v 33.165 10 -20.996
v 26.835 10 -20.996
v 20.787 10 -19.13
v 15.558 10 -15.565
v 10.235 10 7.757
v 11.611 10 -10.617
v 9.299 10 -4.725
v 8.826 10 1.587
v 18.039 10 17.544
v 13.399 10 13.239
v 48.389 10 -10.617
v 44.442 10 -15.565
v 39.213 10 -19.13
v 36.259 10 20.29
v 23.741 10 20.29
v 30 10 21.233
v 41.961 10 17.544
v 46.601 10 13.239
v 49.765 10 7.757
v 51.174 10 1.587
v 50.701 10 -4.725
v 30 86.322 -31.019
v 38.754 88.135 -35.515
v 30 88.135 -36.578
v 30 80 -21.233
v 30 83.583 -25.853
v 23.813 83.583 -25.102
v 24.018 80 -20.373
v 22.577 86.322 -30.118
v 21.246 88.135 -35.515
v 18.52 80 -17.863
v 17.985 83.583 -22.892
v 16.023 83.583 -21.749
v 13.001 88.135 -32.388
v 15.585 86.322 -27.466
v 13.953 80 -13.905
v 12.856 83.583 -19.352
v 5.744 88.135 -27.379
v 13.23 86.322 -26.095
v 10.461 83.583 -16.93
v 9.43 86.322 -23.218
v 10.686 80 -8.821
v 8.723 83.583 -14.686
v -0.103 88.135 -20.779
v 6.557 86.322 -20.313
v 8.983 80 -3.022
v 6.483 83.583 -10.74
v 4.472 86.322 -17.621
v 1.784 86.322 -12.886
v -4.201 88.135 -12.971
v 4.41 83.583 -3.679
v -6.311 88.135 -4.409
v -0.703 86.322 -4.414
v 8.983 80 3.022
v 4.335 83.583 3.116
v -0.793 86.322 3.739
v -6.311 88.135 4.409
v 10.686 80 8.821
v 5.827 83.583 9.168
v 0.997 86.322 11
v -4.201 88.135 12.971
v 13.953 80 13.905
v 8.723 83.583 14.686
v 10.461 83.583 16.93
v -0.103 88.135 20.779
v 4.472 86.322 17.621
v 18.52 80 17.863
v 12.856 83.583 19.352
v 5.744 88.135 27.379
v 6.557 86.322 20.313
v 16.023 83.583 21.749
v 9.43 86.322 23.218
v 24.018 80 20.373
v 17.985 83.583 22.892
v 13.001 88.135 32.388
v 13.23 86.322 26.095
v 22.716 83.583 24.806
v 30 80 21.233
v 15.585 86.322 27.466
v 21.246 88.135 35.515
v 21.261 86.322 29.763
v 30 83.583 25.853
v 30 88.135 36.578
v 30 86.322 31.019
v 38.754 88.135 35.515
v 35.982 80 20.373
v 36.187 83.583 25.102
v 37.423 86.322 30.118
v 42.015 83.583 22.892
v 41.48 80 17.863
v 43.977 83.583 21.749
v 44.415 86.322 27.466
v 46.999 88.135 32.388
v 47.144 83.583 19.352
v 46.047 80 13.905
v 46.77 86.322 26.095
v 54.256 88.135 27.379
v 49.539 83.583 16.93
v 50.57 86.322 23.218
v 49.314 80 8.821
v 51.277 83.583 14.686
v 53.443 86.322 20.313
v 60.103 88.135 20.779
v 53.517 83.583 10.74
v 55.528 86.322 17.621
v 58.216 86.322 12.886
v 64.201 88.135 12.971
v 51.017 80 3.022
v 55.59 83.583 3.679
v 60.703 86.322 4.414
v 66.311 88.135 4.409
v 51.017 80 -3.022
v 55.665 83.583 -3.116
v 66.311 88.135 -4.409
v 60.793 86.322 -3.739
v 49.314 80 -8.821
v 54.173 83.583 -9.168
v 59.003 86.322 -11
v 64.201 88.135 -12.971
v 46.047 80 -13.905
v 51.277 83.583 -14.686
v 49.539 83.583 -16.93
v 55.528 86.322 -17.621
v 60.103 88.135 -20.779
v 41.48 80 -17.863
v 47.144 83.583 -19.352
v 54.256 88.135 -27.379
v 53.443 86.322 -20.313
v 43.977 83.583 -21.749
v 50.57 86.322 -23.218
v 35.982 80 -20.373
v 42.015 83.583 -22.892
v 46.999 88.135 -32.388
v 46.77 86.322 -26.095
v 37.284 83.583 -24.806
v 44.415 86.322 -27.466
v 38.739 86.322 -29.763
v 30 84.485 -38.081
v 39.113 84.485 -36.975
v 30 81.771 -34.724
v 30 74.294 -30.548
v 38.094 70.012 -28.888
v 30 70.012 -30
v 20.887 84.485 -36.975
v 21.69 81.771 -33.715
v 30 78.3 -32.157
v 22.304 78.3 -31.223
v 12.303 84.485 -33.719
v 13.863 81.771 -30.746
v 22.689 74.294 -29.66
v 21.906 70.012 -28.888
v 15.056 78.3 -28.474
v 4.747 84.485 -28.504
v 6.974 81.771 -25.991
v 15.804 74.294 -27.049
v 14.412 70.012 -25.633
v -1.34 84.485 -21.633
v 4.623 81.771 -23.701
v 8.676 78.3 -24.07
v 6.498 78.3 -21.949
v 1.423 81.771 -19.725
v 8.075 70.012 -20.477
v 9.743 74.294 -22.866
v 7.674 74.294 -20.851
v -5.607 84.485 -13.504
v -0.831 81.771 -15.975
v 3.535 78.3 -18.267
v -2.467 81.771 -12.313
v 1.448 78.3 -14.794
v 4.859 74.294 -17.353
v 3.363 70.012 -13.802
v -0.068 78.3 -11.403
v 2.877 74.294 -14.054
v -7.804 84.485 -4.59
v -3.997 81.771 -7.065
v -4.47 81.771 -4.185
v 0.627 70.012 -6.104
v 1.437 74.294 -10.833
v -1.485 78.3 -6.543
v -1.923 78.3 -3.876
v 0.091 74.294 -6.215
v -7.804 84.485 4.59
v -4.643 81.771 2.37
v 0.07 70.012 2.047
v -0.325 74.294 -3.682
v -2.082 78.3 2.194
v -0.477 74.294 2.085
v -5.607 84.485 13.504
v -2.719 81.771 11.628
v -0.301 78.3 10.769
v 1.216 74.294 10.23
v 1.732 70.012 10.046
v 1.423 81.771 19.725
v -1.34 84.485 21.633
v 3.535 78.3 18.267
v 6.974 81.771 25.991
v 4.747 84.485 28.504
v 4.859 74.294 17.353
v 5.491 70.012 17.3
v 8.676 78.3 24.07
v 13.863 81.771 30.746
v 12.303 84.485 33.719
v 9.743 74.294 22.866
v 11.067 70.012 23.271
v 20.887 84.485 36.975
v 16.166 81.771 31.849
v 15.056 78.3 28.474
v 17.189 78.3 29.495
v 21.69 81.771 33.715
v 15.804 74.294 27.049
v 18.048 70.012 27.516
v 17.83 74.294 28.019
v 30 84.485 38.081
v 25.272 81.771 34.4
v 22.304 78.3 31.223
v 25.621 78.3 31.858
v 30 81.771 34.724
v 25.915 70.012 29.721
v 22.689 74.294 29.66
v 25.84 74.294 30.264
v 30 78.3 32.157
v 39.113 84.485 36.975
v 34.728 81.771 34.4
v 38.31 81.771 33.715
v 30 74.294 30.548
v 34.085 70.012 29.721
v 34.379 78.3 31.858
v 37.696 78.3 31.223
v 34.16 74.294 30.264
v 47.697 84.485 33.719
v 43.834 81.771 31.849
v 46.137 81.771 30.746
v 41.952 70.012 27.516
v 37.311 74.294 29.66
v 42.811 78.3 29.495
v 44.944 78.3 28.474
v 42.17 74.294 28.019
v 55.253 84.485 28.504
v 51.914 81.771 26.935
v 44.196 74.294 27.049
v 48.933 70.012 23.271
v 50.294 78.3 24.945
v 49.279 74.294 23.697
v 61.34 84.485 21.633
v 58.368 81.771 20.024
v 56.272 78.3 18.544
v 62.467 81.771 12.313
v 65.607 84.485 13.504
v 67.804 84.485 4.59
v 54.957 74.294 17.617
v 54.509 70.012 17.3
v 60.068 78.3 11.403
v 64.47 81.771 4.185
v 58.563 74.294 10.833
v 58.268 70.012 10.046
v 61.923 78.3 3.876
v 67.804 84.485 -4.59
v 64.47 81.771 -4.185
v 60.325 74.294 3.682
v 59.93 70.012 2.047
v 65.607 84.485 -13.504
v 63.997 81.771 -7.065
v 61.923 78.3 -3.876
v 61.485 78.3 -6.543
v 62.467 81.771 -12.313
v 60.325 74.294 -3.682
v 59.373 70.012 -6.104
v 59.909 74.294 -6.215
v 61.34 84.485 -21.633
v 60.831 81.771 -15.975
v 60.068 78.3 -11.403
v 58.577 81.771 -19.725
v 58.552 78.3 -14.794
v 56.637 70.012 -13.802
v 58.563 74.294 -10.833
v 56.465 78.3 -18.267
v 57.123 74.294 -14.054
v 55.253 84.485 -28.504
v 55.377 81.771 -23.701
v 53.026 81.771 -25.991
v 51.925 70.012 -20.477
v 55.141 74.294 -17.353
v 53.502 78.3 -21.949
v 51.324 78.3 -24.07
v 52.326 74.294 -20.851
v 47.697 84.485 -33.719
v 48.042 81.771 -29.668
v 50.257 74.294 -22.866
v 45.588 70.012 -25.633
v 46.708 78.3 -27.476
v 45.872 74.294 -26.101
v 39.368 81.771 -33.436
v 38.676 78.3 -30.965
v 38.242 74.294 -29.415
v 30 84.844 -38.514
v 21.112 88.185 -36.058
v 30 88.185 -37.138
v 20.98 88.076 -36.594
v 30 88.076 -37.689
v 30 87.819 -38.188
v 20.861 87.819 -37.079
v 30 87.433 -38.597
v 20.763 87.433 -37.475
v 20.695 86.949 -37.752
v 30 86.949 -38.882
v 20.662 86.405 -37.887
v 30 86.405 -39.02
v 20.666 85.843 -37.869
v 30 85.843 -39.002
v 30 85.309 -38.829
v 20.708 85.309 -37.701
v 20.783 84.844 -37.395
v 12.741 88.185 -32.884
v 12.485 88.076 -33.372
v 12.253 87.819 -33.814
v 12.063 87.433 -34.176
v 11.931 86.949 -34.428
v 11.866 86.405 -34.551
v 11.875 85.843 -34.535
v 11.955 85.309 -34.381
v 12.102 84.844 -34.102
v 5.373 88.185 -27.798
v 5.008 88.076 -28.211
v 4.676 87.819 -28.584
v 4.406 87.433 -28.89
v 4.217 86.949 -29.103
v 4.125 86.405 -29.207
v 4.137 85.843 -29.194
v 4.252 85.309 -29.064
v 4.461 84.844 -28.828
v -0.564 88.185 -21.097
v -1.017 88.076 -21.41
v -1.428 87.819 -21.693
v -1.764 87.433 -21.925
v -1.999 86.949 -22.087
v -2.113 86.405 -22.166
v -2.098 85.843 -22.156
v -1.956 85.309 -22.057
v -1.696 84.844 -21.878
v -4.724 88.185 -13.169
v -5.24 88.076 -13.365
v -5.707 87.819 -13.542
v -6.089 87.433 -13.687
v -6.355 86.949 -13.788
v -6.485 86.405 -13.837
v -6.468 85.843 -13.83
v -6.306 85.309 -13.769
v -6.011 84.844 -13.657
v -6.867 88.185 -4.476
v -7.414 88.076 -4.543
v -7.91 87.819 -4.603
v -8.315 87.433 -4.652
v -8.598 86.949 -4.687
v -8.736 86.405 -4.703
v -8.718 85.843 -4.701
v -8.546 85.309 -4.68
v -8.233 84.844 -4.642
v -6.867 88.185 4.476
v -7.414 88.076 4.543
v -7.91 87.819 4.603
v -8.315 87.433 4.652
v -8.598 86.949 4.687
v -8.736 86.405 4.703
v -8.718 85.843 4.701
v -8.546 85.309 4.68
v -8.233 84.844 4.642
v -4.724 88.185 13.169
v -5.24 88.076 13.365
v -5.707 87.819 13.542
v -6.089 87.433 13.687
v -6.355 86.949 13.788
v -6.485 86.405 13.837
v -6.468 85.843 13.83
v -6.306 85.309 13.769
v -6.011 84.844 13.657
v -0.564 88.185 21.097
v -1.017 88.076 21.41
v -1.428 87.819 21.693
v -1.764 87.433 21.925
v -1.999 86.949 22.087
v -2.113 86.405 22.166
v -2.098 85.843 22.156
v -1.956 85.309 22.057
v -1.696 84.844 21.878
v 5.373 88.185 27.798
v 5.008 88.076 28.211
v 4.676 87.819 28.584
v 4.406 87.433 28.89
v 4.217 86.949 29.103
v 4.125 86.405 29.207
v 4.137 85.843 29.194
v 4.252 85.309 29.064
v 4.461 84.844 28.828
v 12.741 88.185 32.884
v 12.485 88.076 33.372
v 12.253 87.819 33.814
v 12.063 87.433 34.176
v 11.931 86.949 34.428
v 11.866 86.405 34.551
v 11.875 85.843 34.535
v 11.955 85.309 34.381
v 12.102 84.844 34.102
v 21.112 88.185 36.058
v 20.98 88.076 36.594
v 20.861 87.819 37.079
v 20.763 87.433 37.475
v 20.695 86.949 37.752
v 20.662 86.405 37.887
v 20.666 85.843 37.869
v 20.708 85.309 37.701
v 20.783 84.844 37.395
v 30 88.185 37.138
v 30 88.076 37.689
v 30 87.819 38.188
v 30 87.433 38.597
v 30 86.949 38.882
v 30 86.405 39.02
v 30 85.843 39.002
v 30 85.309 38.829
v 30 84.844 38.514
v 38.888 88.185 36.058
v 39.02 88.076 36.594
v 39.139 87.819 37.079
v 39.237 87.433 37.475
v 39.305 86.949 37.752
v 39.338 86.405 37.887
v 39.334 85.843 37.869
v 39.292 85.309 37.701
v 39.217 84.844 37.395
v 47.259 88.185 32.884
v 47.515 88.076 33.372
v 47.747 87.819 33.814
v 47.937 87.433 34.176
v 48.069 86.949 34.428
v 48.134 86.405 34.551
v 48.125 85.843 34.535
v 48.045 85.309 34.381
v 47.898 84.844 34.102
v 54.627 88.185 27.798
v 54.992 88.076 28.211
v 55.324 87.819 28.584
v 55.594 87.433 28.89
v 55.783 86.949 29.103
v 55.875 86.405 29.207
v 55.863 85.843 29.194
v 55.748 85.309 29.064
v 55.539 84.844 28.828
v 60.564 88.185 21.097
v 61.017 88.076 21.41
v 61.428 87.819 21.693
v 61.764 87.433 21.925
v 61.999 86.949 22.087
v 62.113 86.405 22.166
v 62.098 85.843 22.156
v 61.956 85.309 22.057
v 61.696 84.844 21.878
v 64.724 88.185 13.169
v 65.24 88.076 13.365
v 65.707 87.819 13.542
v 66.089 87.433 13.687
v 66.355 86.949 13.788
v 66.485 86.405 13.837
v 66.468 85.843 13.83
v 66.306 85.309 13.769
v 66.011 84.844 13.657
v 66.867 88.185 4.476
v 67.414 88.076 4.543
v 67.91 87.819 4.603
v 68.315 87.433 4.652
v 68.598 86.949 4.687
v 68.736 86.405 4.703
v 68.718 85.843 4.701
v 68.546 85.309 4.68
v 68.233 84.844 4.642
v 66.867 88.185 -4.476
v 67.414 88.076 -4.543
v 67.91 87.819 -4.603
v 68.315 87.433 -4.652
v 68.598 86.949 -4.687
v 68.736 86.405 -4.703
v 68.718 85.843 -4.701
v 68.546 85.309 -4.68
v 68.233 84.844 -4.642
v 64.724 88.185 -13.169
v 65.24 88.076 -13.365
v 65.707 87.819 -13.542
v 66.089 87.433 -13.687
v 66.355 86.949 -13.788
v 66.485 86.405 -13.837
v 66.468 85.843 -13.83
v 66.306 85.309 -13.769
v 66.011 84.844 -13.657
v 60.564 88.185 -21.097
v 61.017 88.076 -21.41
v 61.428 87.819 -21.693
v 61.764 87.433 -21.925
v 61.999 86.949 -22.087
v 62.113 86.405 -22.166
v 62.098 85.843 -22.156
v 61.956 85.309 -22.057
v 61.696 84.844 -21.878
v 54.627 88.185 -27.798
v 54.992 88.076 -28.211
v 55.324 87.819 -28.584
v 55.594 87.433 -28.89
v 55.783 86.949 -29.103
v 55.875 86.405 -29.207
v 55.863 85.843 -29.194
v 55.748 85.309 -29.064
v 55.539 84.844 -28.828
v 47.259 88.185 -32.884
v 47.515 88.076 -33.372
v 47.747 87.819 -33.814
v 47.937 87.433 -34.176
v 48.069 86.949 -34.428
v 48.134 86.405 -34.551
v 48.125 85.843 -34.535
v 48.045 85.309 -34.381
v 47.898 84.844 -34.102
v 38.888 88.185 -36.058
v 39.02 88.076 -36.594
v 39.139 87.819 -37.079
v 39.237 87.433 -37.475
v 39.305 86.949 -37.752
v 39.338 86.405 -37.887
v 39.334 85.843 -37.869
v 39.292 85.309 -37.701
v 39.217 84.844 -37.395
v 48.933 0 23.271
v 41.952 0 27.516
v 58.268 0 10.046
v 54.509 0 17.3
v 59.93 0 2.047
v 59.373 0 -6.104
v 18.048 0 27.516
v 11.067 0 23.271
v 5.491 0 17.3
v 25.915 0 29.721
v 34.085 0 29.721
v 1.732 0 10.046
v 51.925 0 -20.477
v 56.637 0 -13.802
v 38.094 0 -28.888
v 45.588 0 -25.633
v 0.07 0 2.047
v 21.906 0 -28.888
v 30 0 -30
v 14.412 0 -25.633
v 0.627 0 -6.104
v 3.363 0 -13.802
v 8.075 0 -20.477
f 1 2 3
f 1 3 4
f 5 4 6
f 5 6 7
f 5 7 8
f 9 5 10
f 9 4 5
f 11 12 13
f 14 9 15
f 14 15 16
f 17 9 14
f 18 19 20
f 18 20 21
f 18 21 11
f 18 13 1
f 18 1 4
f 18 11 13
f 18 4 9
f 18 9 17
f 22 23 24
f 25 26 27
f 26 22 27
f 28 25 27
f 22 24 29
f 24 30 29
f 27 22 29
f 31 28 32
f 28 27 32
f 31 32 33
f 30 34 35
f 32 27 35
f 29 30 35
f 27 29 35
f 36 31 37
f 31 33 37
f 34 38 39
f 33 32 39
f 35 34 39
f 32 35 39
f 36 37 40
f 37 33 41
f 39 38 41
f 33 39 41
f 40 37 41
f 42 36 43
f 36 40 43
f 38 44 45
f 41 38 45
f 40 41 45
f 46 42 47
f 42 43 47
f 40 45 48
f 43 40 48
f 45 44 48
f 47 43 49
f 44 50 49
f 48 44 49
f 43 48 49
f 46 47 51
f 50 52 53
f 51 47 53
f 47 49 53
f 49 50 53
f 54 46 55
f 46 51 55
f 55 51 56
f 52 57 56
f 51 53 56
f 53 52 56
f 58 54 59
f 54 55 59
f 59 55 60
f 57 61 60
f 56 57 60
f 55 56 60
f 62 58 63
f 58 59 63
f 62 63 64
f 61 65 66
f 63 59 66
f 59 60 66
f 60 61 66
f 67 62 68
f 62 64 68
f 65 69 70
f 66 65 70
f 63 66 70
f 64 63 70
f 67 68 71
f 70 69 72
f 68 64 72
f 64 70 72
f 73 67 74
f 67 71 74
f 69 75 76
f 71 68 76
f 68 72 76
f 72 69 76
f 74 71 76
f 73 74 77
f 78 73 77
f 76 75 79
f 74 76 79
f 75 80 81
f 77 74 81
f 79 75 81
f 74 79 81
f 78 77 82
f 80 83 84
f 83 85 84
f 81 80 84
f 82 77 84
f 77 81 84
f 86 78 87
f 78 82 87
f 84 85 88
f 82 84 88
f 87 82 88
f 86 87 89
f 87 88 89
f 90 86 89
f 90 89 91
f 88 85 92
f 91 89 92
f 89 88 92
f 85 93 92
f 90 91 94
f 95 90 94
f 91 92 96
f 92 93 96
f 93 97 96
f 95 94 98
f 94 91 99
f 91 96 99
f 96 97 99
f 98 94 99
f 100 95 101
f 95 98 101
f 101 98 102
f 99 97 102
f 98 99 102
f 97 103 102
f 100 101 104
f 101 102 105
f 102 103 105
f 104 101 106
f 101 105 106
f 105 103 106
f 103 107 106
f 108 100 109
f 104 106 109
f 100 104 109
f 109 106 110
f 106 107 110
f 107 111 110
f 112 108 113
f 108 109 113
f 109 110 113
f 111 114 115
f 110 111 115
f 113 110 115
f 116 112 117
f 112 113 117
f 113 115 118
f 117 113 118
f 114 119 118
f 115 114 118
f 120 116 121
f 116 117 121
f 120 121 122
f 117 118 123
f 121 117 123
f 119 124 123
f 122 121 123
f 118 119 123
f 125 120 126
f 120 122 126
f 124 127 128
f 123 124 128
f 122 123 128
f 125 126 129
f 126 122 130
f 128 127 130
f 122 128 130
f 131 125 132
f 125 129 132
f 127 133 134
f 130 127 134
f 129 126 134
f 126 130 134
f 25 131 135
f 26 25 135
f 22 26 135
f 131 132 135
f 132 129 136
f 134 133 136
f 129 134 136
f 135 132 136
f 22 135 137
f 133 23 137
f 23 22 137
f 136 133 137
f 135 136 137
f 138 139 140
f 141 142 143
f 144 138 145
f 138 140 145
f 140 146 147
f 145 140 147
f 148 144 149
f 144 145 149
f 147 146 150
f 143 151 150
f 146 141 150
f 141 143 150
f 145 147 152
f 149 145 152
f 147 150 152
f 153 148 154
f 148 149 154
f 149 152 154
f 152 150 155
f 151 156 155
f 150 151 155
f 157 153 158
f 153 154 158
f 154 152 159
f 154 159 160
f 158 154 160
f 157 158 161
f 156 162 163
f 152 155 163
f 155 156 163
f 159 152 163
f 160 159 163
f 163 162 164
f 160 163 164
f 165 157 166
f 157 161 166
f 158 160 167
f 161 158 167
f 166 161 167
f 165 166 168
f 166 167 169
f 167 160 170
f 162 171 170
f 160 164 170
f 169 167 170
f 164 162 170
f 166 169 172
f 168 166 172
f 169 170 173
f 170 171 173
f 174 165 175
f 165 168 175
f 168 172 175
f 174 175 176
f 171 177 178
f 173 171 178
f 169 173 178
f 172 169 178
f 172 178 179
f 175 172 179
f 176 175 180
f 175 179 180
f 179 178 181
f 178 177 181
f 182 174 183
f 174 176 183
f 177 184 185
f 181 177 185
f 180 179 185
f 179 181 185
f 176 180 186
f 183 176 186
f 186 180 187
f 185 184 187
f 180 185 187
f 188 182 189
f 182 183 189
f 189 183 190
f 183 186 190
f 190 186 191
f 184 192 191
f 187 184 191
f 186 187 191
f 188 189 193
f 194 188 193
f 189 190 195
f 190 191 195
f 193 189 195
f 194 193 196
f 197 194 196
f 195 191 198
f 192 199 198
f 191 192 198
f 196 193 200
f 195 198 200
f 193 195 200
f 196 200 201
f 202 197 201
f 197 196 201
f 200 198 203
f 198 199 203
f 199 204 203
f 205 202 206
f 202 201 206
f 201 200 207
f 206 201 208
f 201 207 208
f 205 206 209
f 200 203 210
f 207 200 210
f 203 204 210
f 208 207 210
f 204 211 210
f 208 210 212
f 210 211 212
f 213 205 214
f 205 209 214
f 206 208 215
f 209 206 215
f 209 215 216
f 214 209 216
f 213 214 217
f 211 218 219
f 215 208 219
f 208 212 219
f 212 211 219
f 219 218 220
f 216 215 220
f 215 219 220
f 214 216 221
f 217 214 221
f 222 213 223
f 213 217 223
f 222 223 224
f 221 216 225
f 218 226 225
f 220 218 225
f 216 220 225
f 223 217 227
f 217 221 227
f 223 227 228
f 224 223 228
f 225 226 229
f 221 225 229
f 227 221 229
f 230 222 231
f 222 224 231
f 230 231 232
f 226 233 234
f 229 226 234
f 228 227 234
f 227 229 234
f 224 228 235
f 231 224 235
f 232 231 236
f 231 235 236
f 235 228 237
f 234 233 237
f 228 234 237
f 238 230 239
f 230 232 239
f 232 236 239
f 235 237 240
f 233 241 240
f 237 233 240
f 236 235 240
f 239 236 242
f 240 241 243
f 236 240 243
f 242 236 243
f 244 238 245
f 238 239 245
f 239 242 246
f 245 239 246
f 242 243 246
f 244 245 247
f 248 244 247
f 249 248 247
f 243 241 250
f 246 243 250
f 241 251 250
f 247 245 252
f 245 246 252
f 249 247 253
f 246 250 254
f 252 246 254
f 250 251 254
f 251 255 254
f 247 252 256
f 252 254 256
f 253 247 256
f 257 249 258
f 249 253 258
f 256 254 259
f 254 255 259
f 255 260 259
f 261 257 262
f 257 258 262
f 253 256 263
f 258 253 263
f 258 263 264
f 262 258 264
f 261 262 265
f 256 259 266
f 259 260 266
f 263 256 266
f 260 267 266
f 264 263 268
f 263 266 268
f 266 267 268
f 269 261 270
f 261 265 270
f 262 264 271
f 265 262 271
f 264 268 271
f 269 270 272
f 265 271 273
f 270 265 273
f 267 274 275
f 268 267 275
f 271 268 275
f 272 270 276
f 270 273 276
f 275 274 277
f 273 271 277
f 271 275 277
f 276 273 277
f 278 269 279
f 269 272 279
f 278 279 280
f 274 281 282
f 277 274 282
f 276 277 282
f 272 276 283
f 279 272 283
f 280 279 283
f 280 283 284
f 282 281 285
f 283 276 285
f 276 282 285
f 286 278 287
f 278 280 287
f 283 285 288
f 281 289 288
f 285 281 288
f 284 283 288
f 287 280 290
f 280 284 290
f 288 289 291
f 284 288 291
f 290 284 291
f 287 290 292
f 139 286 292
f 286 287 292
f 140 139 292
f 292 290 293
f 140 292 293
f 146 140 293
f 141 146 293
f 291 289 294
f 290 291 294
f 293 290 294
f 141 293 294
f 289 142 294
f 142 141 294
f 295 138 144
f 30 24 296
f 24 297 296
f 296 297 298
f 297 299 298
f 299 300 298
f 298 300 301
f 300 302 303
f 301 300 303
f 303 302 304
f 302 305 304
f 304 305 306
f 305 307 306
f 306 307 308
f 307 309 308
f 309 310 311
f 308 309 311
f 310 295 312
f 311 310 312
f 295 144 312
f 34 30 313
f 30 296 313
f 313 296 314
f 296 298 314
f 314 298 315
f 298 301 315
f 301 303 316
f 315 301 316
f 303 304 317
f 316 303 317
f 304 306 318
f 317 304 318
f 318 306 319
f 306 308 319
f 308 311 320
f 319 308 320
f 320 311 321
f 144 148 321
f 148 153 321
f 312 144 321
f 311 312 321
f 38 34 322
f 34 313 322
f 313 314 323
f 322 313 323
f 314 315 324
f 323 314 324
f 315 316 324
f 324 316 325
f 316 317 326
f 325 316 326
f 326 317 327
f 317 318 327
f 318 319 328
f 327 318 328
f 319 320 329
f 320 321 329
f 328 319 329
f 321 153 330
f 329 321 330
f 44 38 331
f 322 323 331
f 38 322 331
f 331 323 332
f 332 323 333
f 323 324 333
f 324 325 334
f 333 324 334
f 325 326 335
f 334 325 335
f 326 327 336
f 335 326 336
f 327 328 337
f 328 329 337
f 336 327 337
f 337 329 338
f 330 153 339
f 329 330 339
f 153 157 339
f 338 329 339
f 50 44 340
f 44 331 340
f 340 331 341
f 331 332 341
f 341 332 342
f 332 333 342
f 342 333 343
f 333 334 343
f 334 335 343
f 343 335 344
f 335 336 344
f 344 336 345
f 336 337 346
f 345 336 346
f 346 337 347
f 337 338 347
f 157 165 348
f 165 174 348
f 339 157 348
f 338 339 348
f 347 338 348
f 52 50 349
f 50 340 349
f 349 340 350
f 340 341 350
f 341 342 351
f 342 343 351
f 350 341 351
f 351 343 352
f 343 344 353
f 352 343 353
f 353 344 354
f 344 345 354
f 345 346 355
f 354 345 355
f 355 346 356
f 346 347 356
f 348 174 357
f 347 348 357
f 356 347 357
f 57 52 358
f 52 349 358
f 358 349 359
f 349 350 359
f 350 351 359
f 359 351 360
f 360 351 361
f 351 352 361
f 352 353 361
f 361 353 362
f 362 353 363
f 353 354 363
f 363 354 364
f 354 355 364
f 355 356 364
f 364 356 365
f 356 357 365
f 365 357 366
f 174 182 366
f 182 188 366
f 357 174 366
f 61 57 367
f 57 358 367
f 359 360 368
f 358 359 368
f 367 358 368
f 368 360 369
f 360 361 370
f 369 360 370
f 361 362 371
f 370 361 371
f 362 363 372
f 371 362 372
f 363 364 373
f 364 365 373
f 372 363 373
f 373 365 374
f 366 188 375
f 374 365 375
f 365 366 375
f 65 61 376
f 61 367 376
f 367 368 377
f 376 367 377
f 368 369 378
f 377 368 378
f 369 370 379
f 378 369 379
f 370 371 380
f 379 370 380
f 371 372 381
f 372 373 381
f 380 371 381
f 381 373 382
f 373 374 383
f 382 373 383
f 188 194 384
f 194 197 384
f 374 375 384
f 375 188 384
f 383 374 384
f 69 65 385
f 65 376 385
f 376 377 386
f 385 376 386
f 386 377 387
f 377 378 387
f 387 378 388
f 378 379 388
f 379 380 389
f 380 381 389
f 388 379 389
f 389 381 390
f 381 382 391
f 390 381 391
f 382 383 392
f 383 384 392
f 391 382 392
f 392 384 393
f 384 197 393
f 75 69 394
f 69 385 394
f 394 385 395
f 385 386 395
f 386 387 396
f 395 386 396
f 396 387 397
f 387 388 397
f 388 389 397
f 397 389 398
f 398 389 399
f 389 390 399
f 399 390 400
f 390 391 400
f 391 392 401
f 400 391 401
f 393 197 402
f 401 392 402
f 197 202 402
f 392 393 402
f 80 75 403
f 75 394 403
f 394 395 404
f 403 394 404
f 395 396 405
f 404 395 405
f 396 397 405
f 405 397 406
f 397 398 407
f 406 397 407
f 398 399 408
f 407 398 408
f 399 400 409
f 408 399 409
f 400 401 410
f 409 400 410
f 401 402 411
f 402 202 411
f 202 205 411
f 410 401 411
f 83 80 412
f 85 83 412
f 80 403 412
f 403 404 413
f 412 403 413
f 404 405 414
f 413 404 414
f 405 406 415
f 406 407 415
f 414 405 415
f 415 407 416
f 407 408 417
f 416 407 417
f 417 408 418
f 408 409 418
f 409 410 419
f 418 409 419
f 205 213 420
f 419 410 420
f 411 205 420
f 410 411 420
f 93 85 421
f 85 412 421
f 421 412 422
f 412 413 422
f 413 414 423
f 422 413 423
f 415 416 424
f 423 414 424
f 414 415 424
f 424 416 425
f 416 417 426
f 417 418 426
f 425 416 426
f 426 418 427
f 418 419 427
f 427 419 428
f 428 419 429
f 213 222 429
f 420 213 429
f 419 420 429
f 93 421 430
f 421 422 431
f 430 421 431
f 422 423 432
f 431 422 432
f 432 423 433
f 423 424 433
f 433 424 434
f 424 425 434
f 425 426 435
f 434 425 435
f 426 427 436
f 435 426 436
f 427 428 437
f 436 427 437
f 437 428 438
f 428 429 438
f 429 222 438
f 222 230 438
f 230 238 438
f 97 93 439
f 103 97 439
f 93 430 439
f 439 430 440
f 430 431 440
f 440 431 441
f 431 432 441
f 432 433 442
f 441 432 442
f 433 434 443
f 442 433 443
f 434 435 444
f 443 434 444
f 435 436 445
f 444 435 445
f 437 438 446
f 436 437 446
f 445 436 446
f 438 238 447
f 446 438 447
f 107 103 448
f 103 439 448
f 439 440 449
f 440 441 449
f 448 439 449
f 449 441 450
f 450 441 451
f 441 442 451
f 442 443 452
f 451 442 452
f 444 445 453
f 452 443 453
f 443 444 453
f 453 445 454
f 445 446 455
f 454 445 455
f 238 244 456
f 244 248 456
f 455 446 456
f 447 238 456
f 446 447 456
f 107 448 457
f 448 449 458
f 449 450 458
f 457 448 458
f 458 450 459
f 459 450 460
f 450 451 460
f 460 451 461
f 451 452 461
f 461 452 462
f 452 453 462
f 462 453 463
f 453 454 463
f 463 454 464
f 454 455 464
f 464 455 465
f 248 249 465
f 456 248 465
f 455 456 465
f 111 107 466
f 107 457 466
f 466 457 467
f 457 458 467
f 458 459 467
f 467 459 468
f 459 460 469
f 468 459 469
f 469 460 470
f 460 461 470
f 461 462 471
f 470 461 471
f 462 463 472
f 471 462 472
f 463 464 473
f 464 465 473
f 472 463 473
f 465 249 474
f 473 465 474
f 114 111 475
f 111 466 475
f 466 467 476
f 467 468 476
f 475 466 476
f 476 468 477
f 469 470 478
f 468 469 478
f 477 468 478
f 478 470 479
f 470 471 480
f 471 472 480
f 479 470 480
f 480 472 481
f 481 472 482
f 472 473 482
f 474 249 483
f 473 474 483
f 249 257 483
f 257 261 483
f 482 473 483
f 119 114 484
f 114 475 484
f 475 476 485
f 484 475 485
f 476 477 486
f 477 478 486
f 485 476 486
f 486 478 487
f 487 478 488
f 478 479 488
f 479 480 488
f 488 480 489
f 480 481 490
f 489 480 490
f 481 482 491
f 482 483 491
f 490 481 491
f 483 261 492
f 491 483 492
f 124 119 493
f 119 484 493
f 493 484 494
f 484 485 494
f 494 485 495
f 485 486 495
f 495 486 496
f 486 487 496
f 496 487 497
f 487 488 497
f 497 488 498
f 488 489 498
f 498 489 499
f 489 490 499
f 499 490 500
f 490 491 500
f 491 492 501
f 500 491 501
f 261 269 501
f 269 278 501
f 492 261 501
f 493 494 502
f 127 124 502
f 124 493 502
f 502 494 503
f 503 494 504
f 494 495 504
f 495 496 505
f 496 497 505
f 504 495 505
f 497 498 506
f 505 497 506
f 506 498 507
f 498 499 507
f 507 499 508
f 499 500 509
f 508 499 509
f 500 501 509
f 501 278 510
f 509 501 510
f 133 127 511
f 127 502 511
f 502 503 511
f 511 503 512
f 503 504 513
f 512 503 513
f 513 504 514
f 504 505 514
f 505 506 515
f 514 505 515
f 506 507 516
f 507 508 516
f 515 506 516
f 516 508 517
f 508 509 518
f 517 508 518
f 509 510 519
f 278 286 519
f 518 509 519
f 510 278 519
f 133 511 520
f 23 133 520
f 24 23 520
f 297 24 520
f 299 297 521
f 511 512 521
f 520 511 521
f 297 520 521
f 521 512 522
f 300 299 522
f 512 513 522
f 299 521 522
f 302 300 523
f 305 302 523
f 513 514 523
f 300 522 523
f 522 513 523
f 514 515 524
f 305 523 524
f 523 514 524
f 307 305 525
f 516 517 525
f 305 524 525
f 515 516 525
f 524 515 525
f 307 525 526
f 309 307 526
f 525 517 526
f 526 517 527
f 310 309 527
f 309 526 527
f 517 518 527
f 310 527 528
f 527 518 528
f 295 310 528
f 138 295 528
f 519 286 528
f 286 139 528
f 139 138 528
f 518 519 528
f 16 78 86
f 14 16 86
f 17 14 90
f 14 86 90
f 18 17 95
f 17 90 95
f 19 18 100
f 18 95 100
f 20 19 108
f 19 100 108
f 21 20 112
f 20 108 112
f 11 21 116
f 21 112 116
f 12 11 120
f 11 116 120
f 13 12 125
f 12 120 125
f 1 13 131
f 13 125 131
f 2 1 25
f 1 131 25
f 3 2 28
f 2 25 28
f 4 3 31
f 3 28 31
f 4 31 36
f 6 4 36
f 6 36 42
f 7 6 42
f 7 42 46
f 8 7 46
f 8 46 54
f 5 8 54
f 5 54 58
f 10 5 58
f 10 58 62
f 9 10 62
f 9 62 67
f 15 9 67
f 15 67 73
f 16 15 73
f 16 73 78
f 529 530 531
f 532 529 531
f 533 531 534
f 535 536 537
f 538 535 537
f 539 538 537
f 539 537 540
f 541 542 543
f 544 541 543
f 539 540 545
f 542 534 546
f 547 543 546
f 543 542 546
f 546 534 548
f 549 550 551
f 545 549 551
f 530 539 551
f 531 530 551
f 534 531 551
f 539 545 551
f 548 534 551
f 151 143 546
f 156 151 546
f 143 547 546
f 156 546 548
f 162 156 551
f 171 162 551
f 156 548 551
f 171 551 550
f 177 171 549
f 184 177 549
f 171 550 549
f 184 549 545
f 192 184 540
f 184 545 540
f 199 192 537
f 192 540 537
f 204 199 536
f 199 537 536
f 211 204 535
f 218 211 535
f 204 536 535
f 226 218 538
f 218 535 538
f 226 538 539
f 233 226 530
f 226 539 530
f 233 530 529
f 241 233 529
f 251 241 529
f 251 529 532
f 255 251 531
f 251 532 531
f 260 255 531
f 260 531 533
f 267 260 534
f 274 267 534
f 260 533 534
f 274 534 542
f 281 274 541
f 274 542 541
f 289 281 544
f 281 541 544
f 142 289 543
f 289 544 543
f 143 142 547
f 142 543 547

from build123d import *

# Parameters (mm, degrees)
SKETCH3_R          = 21.233227614
CUT_EXTRUDE1_DEPTH = 70


with BuildPart() as part:
    # Sketch1 → Revolve2 (revolve)
    with BuildSketch(Plane.XY, mode=Mode.PRIVATE) as revolve2_sk:
        with BuildLine():
            Line((0, 0), (30, 0))
            Line((30, 0), (30, 80))
            Line((30, 80), (8.888669742, 80))
            Line((8.888669742, 80), (8.766772386, 80))
            ThreePointArc((8.766772386, 80), (1.622655606, 85.063799106), (-6.577845512, 88.134995516))
            ThreePointArc((-6.577845512, 88.134995516), (-8.881517974, 86.949044637), (-8.081497092, 84.484627285))
            ThreePointArc((-8.081497092, 84.484627285), (-2.157248411, 78.299991195), (0, 70.011883734))
            Line((0, 70.011883734), (0, 0))
        make_face()
    revolve(revolve2_sk.sketch.rotate(Axis((30, 0, 0), (0, 1, 0)), 270), axis=Axis((30, 0, 0), (0, 1, 0)))

    # Sketch3 → Cut-Extrude1 (cut)
    with BuildSketch(Plane(origin=(0, 80, 0), x_dir=(1, 0, 0), z_dir=(0, 1, 0))):
        with Locations(Location((30, 0, 0), (0, 0, 270))):
            Circle(SKETCH3_R)
    extrude(amount=-CUT_EXTRUDE1_DEPTH, mode=Mode.SUBTRACT)


solid = part.part
